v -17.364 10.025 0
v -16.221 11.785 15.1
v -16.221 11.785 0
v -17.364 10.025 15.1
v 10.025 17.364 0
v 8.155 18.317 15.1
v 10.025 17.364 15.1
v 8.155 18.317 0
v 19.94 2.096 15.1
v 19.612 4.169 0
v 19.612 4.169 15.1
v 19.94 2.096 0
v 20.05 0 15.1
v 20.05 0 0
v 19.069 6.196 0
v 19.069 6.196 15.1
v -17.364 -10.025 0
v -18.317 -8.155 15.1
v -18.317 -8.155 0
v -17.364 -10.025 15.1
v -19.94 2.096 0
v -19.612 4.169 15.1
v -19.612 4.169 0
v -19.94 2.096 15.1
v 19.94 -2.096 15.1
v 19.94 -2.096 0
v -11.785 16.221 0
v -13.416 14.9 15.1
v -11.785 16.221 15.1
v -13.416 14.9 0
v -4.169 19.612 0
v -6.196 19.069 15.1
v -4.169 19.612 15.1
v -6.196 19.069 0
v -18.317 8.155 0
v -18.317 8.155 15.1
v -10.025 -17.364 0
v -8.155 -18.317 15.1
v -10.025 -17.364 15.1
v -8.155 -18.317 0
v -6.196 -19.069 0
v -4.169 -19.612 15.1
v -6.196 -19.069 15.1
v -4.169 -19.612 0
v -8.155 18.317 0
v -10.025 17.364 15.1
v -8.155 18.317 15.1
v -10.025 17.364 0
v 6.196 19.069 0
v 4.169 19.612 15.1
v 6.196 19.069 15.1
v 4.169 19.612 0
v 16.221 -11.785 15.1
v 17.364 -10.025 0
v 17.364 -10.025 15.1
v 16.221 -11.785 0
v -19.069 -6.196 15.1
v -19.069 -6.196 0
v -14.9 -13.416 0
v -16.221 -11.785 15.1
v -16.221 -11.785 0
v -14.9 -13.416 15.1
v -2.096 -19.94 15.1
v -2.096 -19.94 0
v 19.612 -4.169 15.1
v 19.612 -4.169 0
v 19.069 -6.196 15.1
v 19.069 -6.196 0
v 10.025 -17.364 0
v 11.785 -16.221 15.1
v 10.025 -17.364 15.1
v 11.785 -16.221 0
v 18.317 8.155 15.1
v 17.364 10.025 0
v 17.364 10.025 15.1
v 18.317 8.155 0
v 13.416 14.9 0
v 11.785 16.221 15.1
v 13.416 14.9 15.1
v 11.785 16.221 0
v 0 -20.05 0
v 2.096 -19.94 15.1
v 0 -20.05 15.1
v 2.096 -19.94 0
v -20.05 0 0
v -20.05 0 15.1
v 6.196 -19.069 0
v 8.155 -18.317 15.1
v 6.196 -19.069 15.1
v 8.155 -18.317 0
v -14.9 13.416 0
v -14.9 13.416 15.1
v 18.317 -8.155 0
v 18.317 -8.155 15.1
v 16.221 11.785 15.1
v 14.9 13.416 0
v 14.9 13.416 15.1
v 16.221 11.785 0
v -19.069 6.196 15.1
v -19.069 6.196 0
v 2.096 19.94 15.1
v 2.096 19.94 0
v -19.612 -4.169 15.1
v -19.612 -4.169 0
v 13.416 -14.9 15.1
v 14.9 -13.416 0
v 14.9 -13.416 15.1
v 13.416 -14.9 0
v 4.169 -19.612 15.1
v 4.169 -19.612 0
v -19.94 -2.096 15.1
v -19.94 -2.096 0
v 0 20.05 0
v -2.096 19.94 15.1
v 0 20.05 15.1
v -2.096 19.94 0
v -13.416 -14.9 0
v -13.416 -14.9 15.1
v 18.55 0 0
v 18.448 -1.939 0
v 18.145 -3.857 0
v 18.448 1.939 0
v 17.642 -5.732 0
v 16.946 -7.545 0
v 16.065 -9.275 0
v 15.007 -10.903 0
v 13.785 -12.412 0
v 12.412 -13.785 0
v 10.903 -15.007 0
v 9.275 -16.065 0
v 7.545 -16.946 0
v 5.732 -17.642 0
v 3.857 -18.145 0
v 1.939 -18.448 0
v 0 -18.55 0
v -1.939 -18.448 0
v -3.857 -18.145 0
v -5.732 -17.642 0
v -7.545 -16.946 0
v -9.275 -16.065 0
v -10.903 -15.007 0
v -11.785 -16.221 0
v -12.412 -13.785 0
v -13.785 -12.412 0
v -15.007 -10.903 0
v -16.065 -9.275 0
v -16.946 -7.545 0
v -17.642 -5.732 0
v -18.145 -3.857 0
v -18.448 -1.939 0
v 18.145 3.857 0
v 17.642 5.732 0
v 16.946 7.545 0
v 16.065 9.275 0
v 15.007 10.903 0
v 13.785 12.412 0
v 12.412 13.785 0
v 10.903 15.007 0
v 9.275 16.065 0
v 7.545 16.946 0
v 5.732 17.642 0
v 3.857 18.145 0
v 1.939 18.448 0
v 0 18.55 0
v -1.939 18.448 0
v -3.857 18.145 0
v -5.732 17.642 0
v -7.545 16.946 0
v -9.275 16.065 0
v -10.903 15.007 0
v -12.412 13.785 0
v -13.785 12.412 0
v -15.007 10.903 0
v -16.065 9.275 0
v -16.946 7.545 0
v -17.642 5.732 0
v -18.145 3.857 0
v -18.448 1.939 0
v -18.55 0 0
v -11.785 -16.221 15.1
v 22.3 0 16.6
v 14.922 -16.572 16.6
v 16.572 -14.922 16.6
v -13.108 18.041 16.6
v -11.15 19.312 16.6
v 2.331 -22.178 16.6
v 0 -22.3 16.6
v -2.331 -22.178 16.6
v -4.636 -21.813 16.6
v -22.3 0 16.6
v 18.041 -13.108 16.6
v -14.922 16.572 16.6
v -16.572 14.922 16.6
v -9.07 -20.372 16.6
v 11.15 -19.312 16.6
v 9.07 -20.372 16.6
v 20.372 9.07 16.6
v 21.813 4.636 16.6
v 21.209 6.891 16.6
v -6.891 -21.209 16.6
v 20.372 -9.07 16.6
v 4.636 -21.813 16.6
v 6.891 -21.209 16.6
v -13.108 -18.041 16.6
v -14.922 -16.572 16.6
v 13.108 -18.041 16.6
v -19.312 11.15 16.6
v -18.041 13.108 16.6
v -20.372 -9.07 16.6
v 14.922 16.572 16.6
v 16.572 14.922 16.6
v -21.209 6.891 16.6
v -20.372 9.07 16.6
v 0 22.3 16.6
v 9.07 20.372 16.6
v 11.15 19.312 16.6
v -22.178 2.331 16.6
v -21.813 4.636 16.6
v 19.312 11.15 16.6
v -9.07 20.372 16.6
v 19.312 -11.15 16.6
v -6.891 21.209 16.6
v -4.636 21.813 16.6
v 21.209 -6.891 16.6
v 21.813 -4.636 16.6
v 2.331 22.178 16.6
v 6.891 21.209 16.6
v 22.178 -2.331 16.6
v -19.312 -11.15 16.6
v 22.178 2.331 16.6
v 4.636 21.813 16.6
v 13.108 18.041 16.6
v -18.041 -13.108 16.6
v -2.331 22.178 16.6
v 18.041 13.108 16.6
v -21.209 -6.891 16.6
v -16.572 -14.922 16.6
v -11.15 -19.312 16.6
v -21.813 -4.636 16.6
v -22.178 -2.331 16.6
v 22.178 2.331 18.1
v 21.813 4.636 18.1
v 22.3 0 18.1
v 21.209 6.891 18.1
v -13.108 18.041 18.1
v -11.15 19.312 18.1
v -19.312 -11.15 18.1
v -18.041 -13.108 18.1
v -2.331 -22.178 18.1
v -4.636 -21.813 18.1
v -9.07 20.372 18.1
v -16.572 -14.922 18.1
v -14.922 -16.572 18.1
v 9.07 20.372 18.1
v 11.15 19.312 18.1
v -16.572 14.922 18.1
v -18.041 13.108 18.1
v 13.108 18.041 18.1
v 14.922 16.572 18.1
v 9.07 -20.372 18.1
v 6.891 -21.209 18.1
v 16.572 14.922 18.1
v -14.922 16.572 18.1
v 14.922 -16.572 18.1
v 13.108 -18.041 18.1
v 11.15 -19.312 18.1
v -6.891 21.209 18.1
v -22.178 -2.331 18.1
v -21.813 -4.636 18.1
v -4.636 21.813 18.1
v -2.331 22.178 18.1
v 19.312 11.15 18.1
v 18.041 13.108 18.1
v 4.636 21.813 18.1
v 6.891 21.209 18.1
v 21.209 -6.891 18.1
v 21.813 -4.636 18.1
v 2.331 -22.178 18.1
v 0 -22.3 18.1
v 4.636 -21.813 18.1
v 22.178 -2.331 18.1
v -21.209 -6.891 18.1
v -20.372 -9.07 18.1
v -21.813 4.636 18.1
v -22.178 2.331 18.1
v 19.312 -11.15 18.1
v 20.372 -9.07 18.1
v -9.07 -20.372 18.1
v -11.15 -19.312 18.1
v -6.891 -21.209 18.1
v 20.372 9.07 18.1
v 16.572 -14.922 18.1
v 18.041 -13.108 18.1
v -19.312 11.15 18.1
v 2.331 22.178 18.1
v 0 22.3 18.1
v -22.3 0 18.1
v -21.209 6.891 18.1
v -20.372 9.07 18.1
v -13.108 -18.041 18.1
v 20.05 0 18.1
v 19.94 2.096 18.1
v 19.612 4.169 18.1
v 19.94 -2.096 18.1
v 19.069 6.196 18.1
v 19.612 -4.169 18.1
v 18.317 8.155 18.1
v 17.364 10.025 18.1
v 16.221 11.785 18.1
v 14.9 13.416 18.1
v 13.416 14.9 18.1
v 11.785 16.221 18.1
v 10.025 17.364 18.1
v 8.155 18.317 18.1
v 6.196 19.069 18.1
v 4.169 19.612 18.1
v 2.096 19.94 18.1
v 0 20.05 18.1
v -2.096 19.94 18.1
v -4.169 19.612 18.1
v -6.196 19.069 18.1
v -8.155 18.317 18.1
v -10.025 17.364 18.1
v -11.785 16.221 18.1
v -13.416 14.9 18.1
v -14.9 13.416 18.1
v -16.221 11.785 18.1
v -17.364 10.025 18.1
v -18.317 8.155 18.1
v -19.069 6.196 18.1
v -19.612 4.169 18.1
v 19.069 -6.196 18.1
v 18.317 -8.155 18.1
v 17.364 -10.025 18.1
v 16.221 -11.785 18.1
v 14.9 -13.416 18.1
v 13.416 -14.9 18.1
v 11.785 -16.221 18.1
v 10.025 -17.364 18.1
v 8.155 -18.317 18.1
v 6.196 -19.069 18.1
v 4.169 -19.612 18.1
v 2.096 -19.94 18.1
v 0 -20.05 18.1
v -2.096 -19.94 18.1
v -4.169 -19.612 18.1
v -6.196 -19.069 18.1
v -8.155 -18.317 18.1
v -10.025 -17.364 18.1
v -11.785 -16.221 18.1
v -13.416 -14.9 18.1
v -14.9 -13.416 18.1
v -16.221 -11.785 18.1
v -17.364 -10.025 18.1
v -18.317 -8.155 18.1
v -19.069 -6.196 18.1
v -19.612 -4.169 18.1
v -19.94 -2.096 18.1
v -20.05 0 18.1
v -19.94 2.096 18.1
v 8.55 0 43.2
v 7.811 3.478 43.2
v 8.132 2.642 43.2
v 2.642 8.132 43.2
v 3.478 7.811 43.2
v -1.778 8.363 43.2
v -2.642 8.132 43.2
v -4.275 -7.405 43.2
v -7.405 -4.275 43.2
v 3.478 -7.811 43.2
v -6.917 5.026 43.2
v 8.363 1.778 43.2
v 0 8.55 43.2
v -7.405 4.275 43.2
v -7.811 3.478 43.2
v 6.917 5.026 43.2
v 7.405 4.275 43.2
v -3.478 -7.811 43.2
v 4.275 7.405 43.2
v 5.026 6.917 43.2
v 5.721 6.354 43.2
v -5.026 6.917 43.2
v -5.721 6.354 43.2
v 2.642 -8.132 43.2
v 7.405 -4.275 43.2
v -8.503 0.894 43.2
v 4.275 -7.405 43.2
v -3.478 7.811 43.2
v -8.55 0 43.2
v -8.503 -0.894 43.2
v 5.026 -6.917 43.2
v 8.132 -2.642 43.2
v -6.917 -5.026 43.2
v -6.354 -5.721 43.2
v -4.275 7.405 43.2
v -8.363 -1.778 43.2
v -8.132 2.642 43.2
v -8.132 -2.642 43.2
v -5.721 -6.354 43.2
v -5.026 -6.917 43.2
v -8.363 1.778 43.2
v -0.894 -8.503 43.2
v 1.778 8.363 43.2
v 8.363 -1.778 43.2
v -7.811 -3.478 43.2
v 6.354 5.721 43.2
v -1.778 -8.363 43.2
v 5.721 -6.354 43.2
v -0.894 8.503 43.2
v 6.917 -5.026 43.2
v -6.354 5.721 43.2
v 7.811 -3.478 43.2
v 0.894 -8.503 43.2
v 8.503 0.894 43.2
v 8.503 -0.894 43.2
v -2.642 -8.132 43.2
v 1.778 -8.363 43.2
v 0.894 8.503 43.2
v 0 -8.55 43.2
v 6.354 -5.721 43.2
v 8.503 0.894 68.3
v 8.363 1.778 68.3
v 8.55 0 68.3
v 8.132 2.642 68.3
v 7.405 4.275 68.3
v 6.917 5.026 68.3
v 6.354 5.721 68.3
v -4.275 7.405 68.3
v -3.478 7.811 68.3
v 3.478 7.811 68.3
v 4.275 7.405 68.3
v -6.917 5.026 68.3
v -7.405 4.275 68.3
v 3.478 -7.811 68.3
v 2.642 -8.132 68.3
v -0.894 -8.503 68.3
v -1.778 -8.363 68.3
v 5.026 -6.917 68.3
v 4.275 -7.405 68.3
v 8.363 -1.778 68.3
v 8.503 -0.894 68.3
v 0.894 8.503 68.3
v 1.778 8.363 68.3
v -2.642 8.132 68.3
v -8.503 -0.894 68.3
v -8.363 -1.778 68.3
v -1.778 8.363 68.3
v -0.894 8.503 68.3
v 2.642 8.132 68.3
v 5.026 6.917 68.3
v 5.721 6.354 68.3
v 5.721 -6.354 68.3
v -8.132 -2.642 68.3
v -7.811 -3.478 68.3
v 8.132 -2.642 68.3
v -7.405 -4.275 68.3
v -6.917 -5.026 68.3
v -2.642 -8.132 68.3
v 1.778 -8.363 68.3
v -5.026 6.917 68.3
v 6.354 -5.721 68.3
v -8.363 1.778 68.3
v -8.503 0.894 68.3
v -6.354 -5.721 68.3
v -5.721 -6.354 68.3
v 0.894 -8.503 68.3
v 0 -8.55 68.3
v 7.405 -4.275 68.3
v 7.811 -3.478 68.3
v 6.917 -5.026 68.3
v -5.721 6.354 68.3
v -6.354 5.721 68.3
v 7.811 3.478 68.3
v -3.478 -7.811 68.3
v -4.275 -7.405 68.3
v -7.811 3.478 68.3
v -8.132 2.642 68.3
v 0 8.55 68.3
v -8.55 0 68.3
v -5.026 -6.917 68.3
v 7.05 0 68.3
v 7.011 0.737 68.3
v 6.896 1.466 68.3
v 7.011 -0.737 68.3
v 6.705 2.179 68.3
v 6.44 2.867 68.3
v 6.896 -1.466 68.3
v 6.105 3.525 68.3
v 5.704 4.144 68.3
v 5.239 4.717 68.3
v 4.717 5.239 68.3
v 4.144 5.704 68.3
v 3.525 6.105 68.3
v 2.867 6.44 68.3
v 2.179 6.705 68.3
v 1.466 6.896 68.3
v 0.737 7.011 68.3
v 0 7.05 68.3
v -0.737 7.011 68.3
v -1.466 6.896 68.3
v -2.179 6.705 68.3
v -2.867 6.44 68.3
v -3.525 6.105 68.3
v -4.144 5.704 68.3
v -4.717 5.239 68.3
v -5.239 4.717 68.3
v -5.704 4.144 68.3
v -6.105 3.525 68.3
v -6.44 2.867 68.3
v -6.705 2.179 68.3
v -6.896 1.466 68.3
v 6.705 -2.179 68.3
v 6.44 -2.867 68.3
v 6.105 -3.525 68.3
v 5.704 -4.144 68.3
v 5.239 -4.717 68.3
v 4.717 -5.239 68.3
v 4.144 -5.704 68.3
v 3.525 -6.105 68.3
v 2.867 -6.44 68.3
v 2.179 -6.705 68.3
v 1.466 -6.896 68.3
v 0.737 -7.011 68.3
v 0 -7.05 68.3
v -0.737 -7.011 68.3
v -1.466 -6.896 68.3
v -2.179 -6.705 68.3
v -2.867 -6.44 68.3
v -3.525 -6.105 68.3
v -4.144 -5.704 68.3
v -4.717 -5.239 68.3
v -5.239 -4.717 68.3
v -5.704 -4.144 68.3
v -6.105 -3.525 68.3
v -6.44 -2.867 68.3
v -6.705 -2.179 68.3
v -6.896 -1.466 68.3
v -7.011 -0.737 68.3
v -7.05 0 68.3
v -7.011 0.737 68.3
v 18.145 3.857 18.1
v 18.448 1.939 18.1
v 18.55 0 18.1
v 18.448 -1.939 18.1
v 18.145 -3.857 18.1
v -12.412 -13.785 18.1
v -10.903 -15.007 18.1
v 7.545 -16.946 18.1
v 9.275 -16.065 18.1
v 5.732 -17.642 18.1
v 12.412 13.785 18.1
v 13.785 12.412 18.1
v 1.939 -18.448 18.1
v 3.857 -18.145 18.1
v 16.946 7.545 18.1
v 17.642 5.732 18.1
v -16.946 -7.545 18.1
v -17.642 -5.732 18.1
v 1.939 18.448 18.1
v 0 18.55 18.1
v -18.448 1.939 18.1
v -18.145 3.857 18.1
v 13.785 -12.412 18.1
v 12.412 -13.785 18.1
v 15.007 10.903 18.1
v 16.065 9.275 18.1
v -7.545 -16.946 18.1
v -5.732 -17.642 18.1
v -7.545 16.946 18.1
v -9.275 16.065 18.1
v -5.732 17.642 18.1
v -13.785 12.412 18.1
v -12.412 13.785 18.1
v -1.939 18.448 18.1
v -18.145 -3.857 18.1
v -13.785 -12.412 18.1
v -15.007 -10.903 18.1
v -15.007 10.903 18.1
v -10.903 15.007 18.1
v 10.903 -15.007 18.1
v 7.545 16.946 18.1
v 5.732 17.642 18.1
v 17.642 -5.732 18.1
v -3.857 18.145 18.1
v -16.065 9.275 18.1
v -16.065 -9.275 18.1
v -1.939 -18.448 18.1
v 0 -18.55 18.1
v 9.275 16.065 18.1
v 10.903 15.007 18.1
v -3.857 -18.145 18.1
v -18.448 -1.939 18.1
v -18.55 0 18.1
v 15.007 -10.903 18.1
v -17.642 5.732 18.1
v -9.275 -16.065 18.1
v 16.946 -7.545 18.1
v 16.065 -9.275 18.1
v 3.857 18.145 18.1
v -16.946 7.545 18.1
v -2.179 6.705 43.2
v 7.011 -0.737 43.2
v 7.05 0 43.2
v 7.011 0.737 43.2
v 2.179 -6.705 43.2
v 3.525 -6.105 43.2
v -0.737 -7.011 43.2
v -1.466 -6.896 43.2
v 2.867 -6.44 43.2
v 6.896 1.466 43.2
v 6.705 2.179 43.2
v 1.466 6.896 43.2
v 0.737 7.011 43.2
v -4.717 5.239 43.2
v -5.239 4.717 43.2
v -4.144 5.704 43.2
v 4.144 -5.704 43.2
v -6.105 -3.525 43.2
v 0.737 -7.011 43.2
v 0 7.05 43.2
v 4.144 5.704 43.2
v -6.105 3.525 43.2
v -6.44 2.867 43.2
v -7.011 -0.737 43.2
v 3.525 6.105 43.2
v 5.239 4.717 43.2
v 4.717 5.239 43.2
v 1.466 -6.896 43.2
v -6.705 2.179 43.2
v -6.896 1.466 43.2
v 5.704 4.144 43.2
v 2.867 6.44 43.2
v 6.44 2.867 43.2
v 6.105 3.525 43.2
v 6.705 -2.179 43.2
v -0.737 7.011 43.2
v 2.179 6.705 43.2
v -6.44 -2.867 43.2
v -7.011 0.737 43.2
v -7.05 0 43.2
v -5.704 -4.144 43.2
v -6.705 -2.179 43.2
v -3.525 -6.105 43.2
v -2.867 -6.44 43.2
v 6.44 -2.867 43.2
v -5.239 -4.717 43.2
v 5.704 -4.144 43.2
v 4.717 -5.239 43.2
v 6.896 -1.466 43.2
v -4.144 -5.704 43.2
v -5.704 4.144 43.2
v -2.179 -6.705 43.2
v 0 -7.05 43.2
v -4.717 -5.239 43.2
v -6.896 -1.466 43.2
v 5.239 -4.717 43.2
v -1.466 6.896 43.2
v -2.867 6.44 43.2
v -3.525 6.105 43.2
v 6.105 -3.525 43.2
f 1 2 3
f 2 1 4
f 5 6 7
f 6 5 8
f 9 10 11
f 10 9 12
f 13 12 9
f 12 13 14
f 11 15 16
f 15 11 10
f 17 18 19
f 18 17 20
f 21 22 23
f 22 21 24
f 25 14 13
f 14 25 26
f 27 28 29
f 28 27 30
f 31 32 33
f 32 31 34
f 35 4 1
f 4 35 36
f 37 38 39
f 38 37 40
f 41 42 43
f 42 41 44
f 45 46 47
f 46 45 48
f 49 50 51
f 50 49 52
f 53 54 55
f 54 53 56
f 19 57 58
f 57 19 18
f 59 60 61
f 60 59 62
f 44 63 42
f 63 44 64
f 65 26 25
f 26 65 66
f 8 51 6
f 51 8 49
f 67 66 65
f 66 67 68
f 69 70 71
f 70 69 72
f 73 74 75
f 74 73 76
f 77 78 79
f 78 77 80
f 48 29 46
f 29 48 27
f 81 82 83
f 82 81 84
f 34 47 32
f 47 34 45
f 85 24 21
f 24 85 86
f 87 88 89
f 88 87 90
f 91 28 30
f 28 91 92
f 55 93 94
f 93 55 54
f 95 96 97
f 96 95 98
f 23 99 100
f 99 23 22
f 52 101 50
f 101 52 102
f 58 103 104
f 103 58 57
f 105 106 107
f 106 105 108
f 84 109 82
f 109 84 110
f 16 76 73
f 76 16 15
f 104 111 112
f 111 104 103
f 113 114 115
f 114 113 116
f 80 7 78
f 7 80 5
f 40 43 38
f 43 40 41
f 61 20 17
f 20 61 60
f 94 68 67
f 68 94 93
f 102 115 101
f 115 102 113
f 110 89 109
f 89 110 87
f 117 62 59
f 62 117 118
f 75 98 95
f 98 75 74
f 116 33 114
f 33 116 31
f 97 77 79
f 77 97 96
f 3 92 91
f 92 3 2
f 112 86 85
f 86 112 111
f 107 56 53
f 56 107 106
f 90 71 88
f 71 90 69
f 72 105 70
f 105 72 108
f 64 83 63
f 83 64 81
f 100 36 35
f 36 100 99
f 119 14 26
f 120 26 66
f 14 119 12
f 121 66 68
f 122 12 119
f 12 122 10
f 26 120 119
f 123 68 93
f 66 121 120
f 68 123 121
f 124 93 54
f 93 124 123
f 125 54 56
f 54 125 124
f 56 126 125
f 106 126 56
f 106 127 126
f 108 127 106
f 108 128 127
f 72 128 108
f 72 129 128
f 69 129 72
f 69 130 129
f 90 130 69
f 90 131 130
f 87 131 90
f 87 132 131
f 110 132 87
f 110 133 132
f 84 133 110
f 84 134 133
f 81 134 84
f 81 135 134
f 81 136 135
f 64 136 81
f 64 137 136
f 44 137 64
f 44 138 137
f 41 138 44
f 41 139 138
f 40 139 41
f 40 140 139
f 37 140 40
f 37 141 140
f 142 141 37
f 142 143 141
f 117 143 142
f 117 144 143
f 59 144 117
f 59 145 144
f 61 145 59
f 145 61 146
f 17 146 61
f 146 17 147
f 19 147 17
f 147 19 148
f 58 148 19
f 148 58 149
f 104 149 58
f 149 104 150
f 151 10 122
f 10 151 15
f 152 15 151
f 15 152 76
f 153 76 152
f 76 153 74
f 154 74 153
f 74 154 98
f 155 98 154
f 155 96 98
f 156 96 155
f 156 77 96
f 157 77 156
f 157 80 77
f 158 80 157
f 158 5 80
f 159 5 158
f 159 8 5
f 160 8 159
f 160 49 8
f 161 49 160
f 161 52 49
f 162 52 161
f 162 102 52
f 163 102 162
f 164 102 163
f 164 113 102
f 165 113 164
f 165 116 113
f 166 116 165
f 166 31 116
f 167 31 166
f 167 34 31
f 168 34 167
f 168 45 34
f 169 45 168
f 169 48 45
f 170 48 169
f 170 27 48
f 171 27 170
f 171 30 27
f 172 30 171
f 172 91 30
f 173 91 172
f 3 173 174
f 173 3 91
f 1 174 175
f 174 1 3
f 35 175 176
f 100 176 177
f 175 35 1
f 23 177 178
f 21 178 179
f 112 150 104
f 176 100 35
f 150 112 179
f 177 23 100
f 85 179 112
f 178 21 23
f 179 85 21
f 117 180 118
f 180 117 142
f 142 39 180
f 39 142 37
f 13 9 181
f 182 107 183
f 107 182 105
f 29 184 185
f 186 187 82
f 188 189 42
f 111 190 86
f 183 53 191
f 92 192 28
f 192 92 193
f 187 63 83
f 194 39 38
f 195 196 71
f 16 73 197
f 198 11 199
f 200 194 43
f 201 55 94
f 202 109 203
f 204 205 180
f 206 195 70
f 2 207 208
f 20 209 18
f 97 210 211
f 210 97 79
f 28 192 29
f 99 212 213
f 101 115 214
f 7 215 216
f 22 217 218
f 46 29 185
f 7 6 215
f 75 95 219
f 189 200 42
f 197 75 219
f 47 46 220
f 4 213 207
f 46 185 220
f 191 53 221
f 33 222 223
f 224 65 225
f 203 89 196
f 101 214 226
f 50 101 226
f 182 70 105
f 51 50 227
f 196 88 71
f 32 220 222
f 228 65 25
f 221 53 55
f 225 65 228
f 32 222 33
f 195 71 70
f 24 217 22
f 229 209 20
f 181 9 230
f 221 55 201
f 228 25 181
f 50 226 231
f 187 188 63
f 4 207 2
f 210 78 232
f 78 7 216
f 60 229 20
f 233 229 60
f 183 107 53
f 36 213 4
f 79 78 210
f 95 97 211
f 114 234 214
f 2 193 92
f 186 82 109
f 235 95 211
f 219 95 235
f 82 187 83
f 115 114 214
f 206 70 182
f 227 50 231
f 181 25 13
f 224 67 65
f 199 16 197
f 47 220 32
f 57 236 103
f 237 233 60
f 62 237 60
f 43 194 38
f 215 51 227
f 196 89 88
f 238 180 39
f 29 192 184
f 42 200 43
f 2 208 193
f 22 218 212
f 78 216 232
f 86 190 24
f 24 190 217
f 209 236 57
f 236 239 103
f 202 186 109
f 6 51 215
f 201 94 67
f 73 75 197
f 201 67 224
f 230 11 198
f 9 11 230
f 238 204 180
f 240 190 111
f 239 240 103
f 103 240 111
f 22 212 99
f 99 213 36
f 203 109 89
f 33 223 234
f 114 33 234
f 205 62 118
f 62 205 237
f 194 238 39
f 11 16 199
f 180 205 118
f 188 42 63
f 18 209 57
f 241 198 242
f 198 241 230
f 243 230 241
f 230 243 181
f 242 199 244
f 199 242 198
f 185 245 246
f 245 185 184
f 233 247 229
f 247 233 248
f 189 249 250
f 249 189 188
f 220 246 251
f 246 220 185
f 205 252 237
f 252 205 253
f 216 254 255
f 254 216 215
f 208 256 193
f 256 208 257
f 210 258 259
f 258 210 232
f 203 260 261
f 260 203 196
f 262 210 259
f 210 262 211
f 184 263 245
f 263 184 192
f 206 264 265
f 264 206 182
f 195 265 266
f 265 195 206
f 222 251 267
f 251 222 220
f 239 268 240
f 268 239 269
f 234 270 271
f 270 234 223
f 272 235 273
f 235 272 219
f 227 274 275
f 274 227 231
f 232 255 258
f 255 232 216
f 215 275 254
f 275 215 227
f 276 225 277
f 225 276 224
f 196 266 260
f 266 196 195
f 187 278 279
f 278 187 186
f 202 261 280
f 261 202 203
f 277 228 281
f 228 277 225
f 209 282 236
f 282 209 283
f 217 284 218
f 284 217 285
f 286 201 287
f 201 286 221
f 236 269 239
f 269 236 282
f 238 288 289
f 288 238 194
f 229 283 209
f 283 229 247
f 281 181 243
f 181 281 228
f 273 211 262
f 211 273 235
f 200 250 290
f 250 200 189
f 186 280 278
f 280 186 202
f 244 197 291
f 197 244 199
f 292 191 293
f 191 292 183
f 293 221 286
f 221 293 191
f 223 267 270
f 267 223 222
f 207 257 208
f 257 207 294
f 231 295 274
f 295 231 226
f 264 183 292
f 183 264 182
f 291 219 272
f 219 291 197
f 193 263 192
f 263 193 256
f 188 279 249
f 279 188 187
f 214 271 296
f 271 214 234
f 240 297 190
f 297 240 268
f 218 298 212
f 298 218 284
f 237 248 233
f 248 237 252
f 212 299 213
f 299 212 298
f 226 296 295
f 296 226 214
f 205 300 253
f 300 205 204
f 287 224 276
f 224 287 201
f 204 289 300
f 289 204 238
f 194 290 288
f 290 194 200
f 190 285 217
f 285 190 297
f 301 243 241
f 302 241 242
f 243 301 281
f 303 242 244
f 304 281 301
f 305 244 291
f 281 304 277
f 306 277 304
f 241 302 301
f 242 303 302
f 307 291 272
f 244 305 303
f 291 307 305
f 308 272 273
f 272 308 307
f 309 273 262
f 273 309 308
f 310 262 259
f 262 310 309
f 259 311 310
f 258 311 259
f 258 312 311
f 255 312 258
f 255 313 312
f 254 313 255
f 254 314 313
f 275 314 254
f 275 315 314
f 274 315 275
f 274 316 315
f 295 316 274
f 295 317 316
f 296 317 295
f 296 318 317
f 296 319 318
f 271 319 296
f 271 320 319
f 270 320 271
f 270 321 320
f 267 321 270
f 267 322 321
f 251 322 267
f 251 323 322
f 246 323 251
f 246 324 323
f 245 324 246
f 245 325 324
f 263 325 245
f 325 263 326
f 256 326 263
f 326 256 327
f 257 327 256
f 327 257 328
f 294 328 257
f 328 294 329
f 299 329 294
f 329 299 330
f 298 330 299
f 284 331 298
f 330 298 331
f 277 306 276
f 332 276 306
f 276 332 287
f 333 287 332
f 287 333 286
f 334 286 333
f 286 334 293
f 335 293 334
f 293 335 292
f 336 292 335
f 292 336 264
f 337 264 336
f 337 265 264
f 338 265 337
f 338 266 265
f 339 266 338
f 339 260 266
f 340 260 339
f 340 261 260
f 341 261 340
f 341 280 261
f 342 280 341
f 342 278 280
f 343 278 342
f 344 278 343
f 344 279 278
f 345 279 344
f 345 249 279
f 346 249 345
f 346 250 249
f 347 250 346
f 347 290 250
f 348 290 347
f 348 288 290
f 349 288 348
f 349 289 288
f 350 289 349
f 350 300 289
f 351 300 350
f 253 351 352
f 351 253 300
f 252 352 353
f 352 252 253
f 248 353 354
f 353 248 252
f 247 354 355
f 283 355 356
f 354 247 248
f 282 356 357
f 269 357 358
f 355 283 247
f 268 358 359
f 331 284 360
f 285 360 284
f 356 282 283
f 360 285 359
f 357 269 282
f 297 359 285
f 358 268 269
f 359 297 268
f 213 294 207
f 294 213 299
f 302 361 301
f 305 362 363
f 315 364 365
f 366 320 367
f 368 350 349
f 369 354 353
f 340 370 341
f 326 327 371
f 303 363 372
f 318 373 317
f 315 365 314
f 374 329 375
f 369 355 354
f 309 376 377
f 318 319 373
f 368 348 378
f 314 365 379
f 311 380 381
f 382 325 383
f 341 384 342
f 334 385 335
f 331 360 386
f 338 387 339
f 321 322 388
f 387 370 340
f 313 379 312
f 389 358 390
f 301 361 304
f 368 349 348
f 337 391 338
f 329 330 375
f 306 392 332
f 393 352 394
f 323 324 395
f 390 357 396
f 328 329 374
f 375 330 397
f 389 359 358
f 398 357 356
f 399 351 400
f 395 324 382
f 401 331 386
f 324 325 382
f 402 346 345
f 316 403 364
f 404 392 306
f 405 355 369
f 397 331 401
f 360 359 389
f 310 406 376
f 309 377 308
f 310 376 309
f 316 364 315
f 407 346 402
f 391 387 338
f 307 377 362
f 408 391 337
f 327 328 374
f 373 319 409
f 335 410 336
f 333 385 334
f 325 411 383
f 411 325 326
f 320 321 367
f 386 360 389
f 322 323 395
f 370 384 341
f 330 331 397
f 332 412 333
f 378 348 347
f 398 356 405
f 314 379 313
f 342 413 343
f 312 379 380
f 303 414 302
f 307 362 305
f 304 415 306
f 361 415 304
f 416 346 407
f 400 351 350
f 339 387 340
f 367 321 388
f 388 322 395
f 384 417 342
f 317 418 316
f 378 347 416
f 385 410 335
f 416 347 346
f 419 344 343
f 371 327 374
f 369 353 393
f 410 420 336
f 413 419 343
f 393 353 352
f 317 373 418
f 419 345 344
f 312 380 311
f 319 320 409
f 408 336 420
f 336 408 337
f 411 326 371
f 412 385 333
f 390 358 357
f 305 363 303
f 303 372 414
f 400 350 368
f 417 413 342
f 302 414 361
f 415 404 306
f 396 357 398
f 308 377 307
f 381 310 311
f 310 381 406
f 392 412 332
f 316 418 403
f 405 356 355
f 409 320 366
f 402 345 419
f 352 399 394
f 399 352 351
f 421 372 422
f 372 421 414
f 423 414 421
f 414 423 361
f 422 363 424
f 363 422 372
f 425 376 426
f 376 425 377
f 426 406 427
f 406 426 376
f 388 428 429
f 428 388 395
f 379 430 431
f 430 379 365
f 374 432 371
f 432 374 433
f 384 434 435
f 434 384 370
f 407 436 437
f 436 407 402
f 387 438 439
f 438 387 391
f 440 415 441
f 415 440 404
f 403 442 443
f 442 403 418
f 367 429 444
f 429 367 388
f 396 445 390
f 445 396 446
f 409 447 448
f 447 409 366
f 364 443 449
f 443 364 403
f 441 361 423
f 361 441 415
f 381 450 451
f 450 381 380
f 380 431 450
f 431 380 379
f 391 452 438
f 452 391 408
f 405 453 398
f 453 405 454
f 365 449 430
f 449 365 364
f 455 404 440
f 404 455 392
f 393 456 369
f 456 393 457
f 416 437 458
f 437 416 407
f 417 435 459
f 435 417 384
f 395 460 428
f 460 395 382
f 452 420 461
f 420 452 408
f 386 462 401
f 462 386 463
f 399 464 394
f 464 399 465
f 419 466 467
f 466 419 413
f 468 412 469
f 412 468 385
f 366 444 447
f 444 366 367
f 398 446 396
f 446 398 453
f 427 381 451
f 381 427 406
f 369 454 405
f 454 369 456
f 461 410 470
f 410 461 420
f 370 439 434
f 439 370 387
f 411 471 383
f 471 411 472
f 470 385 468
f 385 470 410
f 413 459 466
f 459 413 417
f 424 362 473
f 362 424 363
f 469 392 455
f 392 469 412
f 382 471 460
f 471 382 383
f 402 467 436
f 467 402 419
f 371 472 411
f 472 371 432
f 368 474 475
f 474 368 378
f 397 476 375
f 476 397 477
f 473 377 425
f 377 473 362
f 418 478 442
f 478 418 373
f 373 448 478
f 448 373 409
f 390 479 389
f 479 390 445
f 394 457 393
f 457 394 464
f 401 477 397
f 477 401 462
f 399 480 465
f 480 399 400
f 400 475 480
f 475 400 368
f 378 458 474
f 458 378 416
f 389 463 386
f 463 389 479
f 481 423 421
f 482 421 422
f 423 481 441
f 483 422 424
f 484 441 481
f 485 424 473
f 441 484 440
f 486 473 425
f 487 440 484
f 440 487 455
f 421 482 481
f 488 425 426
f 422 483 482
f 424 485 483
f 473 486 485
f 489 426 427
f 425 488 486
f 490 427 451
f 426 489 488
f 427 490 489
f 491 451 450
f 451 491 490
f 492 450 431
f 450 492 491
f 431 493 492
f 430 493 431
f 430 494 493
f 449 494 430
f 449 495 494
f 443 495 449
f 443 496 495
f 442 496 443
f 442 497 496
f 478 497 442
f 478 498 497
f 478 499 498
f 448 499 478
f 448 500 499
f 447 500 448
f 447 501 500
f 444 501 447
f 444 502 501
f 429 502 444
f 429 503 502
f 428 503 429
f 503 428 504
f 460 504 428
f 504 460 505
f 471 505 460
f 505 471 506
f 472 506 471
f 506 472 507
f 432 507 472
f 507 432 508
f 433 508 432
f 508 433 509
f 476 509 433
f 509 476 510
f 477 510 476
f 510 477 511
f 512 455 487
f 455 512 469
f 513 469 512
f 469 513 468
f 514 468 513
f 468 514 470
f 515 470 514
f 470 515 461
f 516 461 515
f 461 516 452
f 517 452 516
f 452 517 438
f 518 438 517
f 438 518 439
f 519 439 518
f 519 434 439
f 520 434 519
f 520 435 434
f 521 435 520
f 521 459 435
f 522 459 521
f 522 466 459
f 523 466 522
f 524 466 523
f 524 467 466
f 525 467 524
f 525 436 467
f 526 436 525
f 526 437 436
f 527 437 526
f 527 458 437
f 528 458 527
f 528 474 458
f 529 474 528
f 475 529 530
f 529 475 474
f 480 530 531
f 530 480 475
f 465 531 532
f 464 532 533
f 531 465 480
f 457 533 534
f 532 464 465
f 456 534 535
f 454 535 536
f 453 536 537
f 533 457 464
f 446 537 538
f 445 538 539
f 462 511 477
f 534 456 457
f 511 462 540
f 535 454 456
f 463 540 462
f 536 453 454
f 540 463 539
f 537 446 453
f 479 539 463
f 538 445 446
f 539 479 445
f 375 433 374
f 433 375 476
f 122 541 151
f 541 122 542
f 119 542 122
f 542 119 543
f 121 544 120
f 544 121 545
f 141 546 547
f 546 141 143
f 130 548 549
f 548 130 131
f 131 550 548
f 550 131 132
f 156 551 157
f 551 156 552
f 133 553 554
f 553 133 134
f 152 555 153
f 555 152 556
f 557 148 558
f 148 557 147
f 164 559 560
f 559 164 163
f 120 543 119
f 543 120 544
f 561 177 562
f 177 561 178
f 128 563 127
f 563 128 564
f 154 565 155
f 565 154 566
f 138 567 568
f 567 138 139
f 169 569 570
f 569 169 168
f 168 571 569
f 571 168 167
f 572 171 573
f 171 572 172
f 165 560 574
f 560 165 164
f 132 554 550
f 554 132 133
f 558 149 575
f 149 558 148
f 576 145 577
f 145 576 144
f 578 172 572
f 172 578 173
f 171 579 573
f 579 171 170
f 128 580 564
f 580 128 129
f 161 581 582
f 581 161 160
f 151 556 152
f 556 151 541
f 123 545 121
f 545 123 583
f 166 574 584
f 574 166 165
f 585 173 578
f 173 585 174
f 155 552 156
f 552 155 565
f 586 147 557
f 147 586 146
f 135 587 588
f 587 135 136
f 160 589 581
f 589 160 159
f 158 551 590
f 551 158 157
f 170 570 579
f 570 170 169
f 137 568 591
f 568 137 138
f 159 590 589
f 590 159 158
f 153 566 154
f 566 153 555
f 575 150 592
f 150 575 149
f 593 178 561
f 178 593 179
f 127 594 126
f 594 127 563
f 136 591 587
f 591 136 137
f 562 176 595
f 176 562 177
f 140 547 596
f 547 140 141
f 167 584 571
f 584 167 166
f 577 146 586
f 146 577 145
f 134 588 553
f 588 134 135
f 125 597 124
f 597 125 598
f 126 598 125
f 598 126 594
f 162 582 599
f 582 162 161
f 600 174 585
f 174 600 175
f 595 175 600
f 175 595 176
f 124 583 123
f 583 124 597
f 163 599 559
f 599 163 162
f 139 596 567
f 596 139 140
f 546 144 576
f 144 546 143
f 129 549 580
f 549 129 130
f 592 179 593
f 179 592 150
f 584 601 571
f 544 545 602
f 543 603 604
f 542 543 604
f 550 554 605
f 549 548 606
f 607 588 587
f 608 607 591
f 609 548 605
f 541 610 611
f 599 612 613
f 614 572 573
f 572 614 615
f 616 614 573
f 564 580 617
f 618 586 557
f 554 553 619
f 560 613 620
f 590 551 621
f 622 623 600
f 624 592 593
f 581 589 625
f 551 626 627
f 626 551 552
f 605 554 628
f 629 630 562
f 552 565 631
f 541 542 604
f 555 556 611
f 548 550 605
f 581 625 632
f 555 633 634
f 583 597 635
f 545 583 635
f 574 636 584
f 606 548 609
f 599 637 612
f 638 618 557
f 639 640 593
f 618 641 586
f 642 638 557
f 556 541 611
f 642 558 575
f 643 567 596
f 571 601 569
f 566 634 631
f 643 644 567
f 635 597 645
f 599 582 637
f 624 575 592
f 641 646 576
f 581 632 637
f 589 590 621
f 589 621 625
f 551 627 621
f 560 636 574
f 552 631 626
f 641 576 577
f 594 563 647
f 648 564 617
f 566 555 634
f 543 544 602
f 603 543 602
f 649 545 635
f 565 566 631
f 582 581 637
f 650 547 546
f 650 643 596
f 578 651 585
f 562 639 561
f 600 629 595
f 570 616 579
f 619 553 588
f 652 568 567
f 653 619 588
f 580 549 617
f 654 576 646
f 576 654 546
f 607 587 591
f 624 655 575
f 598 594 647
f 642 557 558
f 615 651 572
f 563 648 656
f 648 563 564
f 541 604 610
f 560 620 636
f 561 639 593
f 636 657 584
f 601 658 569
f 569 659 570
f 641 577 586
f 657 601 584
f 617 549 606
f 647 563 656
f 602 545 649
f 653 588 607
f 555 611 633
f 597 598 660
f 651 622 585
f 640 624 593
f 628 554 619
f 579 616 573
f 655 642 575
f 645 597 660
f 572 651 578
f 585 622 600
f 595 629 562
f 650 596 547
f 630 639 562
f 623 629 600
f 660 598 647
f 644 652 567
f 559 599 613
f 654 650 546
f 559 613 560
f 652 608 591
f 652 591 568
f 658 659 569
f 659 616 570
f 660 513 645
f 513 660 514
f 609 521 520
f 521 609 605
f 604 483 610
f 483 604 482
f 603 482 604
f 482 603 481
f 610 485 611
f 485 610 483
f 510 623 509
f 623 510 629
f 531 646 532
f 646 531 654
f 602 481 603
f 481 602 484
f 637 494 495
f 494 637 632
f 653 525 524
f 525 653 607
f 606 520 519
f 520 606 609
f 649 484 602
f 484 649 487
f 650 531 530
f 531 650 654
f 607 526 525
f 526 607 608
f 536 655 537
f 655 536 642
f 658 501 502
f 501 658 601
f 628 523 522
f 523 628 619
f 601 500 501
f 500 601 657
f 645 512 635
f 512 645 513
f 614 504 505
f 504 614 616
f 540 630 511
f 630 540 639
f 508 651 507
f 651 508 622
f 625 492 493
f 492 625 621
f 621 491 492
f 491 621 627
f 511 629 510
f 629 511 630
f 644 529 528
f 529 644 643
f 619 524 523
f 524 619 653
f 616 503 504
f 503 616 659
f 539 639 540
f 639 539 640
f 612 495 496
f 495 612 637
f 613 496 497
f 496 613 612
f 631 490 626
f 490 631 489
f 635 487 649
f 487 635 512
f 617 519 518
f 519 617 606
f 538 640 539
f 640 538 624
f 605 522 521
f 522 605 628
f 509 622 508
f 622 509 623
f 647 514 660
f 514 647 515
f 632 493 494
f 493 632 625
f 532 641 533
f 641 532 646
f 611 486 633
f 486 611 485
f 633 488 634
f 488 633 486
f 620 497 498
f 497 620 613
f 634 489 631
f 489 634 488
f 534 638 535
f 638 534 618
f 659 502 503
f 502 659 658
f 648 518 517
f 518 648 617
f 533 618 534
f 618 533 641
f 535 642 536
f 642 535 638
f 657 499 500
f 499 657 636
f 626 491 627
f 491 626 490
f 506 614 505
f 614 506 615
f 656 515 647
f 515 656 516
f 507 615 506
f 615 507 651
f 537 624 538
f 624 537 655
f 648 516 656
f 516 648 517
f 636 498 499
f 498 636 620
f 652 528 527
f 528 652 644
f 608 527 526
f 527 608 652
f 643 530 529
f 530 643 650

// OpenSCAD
//FollyMaker
//Vacuum Hose Adapter Rev 1 (April 25, 2022) 
//Gather the parameters
/* [Parameters] */

//Example is ShopVac Nominal 2.5" machine port to 1.5" accessory.  -- For the large end, is the measurement the adapter's outside or inside diameter?
LargeEndMeasured = "outside"; //[outside, inside]
//Diameter of Large End? (mm)
LargeEndDiameter = 40.1;
// Length of Large End? (mm)
LargeEndLength = 15.1;
//For the small end, is the measurement the adapter's outside or inside diameter?
SmallEndMeasured = "outside"; //[outside, inside]
//Diameter of Small End? (mm)
SmallEndDiameter = 17.1;
// Length of Small End? (mm)
SmallEndLength = 25.1;
// Length of Taper Section? (mm)
TaperLength = 25.1;
//What is the thickness of the adapter's walls?
 WallThickness = 1.5;
// Create an Inside Stop at the lower end of smaller section of this adapter? (To prevent the connected fitting from being sucked in.)
 InsideStop= "no"; //[no,yes]

 
 
 $fn=60 *1;
 
     WT=WallThickness;
     LL=LargeEndLength;
     SL=SmallEndLength;
     TL=TaperLength;
     
     LOD=  LargeEndMeasured =="inside" ? LargeEndDiameter + 2*WT : LargeEndDiameter;
     SOD=  SmallEndMeasured =="inside" ? SmallEndDiameter + 2*WT : SmallEndDiameter;
     LID = LOD - 2*WT;
     SID = SOD - 2*WT;
     DR = LOD + 3*WT;
     
 
module TransCylinder(D1, D2, H, Z)
    {
        translate([0, 0, Z])
        {
            cylinder(d1=D1, d2=D2, h=H, center=false);
        }
    }
   
difference()
{
      union()
        { 
            TransCylinder(LOD, LOD, LL, 0);
            TransCylinder(LOD, DR, WT, LL);
            TransCylinder(DR, DR, WT, LL + WT);
            TransCylinder(LOD, SOD, TL, LL + 2*WT);
            TransCylinder(SOD, SOD, SL, LL + TL + 2*WT);
          } 
     union()
        {
            TransCylinder(LID, LID, LL, 0);
            TransCylinder(LID, LID, WT, LL);
            TransCylinder(LID, LID,  WT, LL + WT);
            TransCylinder(LID, SID, TL, LL + 2*WT);
            if (InsideStop=="yes")
                {
                TransCylinder(SID, SID-(2*WT), WT, LL +TL + 2*WT);
                TransCylinder(SID, SID, SL, LL +TL + 3*WT);
                    }
                else
                    {          
                    TransCylinder(SID, SID, SL, LL +TL + 2*WT);
                    }
        }
}   
